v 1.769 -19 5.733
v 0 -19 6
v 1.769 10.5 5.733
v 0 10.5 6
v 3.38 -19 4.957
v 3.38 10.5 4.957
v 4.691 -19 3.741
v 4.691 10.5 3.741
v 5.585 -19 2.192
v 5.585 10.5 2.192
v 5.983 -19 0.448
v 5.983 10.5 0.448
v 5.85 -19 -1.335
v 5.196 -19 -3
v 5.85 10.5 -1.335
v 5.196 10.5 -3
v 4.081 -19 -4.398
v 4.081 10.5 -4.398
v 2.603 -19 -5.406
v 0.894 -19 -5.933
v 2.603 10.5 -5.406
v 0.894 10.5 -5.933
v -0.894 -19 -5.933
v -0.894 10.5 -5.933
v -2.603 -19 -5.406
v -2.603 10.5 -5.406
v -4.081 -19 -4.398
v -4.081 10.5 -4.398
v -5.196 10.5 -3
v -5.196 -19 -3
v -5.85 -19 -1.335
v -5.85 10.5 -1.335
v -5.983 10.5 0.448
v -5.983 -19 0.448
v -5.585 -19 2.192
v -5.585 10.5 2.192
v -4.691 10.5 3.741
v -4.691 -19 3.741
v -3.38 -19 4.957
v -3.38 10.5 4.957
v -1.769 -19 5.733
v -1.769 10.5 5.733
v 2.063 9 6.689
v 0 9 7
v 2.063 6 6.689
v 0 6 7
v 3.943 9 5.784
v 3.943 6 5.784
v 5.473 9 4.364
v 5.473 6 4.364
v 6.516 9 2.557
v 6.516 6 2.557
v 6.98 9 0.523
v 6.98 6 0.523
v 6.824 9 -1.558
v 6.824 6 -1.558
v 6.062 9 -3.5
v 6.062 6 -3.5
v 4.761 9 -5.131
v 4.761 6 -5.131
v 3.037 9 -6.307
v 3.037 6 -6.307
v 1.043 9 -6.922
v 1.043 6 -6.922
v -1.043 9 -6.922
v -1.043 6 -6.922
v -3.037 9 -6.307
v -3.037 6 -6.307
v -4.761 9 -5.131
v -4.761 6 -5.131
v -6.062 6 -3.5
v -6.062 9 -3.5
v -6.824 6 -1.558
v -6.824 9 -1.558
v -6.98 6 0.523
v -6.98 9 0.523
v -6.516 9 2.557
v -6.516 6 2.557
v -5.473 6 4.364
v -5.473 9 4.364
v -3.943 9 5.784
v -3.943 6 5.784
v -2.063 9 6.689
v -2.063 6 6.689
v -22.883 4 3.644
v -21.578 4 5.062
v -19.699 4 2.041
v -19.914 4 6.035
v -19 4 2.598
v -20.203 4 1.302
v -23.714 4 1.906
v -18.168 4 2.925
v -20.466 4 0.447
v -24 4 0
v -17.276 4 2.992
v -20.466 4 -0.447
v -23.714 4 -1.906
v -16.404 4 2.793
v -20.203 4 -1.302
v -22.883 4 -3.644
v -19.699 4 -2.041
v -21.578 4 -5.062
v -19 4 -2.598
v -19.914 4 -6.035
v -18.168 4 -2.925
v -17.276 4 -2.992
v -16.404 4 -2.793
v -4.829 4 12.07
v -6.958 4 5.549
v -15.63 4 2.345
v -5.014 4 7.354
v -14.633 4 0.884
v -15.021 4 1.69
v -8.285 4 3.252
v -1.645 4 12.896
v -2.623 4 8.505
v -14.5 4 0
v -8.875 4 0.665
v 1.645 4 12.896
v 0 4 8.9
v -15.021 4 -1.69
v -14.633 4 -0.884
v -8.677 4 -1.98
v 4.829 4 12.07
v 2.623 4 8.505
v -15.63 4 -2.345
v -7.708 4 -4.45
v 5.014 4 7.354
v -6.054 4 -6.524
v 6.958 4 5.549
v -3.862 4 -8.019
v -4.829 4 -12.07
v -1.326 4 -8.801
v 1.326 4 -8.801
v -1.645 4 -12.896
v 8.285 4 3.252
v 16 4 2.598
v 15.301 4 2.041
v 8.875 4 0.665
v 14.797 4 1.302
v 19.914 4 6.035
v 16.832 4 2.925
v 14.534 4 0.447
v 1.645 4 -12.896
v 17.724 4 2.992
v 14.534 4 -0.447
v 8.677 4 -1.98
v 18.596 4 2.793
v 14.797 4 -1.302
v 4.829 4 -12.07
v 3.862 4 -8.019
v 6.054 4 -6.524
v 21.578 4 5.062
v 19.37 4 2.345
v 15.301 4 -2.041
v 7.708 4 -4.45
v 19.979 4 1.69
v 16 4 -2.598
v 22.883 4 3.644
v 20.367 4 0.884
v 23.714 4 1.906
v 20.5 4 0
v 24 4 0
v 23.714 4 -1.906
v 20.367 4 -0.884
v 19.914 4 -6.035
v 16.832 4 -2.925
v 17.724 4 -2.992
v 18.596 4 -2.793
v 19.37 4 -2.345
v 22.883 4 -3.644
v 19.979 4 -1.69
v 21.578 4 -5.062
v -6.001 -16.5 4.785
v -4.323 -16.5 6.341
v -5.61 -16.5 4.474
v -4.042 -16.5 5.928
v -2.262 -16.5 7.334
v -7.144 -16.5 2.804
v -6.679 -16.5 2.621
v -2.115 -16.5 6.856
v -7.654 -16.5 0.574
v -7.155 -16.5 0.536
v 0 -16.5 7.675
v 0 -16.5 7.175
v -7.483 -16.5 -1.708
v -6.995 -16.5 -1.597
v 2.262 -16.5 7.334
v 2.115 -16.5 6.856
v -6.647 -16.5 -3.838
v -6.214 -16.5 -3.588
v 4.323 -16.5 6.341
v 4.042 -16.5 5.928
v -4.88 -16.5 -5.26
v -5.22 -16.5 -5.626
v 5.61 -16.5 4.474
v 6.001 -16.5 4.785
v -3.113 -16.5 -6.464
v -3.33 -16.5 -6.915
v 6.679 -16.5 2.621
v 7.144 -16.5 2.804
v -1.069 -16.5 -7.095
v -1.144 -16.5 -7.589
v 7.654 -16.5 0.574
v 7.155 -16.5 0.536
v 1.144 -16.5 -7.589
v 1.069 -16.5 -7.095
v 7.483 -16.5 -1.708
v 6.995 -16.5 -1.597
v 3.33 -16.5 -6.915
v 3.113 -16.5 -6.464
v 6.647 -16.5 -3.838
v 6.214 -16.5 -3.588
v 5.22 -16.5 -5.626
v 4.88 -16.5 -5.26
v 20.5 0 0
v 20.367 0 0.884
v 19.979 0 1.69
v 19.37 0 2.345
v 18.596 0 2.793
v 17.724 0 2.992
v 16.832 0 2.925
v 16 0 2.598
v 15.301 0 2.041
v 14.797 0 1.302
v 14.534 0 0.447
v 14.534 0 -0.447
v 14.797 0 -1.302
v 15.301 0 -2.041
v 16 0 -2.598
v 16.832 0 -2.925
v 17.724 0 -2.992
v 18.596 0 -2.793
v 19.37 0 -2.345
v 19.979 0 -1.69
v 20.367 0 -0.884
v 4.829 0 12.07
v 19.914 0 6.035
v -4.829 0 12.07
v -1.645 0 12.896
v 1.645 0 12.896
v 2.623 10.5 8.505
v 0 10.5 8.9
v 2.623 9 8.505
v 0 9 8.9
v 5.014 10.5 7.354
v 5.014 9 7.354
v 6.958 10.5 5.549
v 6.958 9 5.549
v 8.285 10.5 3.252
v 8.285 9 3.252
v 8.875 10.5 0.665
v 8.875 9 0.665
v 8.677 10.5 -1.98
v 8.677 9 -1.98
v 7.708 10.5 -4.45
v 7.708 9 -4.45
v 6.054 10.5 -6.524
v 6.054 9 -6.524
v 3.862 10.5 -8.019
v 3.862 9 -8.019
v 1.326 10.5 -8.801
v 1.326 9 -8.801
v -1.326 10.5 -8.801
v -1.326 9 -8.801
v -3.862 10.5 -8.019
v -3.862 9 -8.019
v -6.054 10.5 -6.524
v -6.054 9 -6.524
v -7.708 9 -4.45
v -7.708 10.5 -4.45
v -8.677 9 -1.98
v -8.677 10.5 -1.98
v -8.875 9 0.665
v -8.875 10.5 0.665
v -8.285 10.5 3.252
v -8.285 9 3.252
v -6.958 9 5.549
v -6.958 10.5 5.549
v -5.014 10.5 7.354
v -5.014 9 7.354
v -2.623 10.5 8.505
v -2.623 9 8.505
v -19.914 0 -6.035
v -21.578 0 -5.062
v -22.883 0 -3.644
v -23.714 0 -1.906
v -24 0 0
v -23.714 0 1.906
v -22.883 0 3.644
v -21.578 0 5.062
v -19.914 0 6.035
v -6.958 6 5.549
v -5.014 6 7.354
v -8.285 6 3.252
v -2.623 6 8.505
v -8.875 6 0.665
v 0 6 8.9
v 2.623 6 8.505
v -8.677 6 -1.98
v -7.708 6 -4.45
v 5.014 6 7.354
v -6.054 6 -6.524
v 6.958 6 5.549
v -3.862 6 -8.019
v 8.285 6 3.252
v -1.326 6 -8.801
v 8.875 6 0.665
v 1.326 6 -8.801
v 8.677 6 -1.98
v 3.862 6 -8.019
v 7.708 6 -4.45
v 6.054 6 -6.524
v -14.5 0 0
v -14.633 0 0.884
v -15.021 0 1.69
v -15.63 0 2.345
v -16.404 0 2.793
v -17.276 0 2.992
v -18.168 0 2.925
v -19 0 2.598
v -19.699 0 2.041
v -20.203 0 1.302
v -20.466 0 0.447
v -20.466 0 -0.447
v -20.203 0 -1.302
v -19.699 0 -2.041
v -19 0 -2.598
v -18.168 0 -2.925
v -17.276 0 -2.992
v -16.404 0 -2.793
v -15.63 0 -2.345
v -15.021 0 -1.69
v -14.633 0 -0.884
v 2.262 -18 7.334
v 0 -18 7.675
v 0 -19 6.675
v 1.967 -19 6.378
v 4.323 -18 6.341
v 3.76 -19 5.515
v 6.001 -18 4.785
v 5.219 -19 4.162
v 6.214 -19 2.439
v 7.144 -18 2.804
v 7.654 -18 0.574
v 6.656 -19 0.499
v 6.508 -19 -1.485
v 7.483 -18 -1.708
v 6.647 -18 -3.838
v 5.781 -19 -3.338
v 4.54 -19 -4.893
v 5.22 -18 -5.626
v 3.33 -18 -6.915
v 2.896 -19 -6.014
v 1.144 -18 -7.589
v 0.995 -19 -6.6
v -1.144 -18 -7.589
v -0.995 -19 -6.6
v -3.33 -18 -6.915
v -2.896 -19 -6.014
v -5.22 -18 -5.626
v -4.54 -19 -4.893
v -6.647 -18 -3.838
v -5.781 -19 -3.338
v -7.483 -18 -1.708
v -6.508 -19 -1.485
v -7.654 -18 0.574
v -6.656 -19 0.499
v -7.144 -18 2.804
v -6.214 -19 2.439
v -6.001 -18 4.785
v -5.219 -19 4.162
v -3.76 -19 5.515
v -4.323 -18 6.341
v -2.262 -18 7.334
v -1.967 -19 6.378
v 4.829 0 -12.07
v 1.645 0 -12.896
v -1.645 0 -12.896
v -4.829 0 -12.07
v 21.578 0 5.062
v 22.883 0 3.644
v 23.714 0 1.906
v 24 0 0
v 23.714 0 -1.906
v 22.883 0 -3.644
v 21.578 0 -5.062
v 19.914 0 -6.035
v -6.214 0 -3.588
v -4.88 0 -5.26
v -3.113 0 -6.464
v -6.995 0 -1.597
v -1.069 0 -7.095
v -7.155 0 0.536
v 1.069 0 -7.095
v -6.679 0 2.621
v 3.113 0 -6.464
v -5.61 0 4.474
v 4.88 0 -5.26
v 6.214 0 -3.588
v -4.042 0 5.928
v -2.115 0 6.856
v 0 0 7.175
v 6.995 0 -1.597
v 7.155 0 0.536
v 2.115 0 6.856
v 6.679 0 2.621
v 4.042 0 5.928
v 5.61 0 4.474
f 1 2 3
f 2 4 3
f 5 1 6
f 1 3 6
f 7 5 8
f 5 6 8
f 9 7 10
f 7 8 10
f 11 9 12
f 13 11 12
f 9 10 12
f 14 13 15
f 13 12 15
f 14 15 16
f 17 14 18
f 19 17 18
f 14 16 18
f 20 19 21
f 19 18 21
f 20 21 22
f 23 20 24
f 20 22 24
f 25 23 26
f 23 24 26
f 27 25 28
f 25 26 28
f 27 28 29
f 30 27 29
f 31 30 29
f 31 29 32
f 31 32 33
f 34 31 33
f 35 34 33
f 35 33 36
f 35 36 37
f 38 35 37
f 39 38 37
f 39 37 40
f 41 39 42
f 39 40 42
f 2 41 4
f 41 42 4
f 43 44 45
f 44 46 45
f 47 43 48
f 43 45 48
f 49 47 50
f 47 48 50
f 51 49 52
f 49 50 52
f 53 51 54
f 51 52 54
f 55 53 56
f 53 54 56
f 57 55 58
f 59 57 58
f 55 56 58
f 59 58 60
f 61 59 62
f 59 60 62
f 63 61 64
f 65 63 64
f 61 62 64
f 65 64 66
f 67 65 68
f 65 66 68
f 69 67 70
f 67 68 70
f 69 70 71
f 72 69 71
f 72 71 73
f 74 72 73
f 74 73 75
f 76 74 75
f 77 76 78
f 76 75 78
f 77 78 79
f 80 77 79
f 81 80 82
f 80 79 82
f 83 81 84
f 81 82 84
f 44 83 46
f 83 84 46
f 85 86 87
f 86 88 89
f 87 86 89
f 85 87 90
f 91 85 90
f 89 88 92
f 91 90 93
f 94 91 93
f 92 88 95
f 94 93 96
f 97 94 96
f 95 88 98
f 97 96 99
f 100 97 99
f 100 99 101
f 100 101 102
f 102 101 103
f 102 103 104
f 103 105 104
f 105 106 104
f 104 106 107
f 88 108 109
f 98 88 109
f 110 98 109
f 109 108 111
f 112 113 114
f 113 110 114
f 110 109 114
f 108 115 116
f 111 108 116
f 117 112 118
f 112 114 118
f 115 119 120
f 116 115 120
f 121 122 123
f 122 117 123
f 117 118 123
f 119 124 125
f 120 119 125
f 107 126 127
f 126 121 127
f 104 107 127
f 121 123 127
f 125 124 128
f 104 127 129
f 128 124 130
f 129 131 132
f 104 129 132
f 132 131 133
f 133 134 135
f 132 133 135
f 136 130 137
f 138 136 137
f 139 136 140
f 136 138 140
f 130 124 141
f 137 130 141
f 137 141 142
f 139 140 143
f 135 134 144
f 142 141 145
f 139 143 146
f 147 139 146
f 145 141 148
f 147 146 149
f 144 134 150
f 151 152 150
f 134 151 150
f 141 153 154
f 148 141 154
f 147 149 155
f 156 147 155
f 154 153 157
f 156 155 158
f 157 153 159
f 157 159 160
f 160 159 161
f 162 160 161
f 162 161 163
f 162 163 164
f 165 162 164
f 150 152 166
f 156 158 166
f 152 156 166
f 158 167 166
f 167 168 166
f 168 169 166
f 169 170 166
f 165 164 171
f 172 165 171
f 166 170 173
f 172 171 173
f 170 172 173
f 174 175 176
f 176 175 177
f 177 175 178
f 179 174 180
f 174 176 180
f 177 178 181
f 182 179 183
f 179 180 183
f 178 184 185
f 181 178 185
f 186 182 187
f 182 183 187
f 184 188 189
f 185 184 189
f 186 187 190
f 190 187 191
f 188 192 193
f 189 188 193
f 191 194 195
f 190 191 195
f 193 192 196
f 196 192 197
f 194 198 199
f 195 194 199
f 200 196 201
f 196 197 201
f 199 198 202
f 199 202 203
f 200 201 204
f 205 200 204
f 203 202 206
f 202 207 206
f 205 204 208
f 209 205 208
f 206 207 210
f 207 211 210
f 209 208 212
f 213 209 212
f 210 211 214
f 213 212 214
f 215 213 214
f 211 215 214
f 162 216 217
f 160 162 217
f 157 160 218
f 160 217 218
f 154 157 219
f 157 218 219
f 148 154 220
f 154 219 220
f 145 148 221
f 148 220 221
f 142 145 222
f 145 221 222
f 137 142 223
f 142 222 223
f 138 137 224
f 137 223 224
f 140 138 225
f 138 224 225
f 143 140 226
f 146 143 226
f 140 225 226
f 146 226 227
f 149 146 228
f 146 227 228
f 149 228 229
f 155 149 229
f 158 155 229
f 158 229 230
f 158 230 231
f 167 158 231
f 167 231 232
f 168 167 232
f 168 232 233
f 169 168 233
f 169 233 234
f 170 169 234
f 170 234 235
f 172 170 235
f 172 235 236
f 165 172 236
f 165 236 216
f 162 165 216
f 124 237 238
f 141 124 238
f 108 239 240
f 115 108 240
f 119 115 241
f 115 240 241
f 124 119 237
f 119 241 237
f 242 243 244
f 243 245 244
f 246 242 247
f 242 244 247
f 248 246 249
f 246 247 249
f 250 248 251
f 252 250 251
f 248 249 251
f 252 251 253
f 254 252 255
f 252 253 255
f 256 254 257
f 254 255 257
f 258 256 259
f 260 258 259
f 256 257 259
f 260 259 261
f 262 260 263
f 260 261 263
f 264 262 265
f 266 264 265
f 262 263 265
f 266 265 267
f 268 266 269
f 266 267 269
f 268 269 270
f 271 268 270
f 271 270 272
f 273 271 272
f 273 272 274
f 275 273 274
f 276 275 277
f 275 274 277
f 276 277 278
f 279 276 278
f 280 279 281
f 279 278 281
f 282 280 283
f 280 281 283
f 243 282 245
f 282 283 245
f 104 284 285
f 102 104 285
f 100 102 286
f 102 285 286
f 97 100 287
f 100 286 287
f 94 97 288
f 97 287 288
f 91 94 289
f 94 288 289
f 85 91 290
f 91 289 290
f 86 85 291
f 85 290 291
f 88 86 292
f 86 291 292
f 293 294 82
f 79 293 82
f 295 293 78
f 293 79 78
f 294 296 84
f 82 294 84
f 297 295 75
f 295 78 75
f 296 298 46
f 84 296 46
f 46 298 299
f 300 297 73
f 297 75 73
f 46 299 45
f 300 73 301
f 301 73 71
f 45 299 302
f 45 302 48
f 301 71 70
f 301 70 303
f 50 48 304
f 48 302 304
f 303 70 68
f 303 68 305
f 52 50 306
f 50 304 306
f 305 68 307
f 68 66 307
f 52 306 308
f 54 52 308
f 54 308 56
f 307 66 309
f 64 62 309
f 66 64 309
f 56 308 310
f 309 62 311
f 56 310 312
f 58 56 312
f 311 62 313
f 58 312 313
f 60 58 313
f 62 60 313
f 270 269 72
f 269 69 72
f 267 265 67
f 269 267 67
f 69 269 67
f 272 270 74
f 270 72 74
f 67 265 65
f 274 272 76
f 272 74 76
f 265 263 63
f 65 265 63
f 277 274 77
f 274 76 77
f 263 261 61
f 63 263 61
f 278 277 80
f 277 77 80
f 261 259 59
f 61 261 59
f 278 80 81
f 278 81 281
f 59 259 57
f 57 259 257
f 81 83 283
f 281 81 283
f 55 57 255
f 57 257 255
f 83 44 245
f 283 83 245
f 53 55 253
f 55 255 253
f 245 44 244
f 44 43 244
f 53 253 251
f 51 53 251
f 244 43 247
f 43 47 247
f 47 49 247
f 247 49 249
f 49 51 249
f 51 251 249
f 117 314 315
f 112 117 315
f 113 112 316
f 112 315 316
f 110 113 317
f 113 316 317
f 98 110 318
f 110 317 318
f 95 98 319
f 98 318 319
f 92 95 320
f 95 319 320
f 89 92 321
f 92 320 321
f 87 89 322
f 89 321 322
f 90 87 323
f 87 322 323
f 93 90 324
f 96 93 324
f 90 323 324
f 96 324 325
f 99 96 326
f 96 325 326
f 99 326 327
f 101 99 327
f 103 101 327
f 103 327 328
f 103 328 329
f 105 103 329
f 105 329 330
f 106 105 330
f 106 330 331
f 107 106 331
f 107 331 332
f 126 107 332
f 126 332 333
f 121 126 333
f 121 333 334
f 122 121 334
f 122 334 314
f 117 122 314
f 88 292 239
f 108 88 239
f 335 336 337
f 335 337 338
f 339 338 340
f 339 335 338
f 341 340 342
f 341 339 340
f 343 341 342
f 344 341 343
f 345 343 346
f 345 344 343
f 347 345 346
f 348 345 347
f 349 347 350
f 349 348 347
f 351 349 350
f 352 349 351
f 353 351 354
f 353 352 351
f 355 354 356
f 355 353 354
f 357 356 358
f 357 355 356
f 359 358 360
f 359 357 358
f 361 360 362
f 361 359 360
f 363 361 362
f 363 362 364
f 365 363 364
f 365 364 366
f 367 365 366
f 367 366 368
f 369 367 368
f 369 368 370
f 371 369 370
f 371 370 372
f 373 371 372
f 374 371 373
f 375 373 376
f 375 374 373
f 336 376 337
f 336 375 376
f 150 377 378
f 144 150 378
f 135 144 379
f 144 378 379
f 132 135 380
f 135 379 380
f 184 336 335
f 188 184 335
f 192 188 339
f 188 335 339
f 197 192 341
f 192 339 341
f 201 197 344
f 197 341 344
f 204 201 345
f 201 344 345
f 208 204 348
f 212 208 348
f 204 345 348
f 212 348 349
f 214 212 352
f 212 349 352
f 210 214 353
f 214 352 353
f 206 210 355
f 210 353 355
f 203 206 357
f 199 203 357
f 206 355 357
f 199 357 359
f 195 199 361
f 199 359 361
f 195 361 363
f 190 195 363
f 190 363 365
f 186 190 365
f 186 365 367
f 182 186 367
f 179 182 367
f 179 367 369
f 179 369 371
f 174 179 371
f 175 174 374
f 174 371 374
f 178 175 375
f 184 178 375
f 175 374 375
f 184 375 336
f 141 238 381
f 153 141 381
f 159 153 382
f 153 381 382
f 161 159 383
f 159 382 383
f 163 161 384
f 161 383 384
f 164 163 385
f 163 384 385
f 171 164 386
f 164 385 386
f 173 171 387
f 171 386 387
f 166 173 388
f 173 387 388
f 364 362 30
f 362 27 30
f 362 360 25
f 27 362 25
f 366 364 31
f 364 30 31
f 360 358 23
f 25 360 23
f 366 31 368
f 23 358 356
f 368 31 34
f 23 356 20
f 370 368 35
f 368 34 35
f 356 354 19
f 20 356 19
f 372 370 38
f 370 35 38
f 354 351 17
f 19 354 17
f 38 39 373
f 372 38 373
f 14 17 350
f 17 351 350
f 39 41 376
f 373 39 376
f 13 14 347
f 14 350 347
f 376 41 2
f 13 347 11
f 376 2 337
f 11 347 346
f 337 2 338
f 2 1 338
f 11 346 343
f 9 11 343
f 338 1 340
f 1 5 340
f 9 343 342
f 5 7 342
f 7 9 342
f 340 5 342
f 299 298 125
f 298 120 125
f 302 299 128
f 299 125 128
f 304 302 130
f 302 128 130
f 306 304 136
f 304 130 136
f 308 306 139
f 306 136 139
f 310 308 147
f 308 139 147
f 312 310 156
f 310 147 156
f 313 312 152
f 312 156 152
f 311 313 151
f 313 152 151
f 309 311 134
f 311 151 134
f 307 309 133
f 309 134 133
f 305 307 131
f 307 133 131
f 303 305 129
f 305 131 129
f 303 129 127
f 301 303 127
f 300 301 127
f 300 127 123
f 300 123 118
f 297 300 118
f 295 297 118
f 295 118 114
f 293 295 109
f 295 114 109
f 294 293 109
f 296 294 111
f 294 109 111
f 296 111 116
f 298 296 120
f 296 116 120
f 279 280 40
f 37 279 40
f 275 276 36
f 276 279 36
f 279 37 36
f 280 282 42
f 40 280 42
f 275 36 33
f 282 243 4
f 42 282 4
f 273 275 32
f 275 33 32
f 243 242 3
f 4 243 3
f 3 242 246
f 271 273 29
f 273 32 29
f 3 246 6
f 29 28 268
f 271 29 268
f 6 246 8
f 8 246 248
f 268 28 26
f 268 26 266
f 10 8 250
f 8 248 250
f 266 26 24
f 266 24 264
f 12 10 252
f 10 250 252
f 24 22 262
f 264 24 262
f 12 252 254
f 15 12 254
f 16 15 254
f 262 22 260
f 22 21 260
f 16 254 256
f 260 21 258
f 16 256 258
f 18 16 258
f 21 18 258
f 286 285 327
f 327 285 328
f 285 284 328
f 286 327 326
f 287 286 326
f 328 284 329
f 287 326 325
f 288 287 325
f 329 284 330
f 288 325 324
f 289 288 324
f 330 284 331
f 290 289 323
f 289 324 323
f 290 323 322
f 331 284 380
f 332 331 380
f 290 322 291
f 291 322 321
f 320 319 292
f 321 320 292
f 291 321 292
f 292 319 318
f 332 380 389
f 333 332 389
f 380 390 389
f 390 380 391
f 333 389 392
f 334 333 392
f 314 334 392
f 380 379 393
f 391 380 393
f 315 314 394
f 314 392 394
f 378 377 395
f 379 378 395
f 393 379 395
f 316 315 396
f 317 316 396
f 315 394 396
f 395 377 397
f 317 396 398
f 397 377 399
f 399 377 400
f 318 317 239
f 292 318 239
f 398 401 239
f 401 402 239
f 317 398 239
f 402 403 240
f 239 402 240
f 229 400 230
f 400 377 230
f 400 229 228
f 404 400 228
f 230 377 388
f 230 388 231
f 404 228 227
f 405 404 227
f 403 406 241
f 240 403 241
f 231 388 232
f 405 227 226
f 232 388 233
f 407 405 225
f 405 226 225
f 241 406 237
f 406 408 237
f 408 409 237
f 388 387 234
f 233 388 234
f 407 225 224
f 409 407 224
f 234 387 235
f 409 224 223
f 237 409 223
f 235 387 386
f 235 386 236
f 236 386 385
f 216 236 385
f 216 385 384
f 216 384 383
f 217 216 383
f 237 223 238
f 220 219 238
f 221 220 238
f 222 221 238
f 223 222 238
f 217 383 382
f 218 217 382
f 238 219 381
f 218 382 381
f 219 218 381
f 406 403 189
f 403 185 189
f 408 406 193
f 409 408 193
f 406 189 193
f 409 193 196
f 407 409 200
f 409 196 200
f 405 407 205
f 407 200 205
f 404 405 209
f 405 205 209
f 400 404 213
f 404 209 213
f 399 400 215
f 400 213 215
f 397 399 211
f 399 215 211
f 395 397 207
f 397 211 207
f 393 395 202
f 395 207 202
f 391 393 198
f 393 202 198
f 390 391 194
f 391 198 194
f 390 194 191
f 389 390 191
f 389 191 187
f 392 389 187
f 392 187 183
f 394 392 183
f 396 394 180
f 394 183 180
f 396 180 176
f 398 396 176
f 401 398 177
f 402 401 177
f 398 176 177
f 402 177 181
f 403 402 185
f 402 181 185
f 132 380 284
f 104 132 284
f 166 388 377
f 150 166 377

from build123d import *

# Parameters (mm, degrees)
F2_SIZE  = 1
F3_R     = 30
F4_DEPTH = 25
F3_R_2   = 3
F5_DEPTH = 25


with BuildPart() as f1:
    # F0 (on Right) → F1 (revolve)
    with BuildSketch(Plane.YZ):
        Polygon((-19, 7.675), (-19, 6), (10.5, 6), (10.5, 8.9), (9, 8.9), (9, 7), (6, 7), (6, 8.9), (4, 8.9), (4, 24), (0, 24), (0, 7.175), (-16.5, 7.175), (-16.5, 7.675), align=None)
    revolve(axis=Axis((0, -3.653569, 0), (0, 1, 0)))

    # F2
    f2_edges = [f1.edges().sort_by_distance(p)[0] for p in [
        (0, -19, -7.675),
    ]]
    chamfer(f2_edges, length=F2_SIZE)

    # F3 (on face) → F4 (cut)
    with BuildSketch(Plane.XZ):
        Circle(F3_R)
        with BuildLine():
            ThreePointArc((-19.914286, -6.035), (-24, 0), (-19.914286, 6.035))
            Line((-19.914286, 6.035), (-4.828571, 12.07))
            ThreePointArc((-4.828571, 12.07), (0, 13), (4.828571, 12.07))
            Line((4.828571, 12.07), (19.914286, 6.035))
            ThreePointArc((19.914286, 6.035), (24, 0), (19.914286, -6.035))
            Line((19.914286, -6.035), (4.828571, -12.07))
            ThreePointArc((4.828571, -12.07), (0, -13), (-4.828571, -12.07))
            Line((-4.828571, -12.07), (-19.914286, -6.035))
        make_face(mode=Mode.SUBTRACT)
    extrude(amount=-F4_DEPTH, mode=Mode.SUBTRACT)

    # F3 (on face) → F5 (cut)
    with BuildSketch(Plane.XZ):
        with Locations((17.5, 0)):
            Circle(F3_R_2)
        with Locations((-17.5, 0)):
            Circle(F3_R_2)
    extrude(amount=-F5_DEPTH, mode=Mode.SUBTRACT)


solid = f1.part
